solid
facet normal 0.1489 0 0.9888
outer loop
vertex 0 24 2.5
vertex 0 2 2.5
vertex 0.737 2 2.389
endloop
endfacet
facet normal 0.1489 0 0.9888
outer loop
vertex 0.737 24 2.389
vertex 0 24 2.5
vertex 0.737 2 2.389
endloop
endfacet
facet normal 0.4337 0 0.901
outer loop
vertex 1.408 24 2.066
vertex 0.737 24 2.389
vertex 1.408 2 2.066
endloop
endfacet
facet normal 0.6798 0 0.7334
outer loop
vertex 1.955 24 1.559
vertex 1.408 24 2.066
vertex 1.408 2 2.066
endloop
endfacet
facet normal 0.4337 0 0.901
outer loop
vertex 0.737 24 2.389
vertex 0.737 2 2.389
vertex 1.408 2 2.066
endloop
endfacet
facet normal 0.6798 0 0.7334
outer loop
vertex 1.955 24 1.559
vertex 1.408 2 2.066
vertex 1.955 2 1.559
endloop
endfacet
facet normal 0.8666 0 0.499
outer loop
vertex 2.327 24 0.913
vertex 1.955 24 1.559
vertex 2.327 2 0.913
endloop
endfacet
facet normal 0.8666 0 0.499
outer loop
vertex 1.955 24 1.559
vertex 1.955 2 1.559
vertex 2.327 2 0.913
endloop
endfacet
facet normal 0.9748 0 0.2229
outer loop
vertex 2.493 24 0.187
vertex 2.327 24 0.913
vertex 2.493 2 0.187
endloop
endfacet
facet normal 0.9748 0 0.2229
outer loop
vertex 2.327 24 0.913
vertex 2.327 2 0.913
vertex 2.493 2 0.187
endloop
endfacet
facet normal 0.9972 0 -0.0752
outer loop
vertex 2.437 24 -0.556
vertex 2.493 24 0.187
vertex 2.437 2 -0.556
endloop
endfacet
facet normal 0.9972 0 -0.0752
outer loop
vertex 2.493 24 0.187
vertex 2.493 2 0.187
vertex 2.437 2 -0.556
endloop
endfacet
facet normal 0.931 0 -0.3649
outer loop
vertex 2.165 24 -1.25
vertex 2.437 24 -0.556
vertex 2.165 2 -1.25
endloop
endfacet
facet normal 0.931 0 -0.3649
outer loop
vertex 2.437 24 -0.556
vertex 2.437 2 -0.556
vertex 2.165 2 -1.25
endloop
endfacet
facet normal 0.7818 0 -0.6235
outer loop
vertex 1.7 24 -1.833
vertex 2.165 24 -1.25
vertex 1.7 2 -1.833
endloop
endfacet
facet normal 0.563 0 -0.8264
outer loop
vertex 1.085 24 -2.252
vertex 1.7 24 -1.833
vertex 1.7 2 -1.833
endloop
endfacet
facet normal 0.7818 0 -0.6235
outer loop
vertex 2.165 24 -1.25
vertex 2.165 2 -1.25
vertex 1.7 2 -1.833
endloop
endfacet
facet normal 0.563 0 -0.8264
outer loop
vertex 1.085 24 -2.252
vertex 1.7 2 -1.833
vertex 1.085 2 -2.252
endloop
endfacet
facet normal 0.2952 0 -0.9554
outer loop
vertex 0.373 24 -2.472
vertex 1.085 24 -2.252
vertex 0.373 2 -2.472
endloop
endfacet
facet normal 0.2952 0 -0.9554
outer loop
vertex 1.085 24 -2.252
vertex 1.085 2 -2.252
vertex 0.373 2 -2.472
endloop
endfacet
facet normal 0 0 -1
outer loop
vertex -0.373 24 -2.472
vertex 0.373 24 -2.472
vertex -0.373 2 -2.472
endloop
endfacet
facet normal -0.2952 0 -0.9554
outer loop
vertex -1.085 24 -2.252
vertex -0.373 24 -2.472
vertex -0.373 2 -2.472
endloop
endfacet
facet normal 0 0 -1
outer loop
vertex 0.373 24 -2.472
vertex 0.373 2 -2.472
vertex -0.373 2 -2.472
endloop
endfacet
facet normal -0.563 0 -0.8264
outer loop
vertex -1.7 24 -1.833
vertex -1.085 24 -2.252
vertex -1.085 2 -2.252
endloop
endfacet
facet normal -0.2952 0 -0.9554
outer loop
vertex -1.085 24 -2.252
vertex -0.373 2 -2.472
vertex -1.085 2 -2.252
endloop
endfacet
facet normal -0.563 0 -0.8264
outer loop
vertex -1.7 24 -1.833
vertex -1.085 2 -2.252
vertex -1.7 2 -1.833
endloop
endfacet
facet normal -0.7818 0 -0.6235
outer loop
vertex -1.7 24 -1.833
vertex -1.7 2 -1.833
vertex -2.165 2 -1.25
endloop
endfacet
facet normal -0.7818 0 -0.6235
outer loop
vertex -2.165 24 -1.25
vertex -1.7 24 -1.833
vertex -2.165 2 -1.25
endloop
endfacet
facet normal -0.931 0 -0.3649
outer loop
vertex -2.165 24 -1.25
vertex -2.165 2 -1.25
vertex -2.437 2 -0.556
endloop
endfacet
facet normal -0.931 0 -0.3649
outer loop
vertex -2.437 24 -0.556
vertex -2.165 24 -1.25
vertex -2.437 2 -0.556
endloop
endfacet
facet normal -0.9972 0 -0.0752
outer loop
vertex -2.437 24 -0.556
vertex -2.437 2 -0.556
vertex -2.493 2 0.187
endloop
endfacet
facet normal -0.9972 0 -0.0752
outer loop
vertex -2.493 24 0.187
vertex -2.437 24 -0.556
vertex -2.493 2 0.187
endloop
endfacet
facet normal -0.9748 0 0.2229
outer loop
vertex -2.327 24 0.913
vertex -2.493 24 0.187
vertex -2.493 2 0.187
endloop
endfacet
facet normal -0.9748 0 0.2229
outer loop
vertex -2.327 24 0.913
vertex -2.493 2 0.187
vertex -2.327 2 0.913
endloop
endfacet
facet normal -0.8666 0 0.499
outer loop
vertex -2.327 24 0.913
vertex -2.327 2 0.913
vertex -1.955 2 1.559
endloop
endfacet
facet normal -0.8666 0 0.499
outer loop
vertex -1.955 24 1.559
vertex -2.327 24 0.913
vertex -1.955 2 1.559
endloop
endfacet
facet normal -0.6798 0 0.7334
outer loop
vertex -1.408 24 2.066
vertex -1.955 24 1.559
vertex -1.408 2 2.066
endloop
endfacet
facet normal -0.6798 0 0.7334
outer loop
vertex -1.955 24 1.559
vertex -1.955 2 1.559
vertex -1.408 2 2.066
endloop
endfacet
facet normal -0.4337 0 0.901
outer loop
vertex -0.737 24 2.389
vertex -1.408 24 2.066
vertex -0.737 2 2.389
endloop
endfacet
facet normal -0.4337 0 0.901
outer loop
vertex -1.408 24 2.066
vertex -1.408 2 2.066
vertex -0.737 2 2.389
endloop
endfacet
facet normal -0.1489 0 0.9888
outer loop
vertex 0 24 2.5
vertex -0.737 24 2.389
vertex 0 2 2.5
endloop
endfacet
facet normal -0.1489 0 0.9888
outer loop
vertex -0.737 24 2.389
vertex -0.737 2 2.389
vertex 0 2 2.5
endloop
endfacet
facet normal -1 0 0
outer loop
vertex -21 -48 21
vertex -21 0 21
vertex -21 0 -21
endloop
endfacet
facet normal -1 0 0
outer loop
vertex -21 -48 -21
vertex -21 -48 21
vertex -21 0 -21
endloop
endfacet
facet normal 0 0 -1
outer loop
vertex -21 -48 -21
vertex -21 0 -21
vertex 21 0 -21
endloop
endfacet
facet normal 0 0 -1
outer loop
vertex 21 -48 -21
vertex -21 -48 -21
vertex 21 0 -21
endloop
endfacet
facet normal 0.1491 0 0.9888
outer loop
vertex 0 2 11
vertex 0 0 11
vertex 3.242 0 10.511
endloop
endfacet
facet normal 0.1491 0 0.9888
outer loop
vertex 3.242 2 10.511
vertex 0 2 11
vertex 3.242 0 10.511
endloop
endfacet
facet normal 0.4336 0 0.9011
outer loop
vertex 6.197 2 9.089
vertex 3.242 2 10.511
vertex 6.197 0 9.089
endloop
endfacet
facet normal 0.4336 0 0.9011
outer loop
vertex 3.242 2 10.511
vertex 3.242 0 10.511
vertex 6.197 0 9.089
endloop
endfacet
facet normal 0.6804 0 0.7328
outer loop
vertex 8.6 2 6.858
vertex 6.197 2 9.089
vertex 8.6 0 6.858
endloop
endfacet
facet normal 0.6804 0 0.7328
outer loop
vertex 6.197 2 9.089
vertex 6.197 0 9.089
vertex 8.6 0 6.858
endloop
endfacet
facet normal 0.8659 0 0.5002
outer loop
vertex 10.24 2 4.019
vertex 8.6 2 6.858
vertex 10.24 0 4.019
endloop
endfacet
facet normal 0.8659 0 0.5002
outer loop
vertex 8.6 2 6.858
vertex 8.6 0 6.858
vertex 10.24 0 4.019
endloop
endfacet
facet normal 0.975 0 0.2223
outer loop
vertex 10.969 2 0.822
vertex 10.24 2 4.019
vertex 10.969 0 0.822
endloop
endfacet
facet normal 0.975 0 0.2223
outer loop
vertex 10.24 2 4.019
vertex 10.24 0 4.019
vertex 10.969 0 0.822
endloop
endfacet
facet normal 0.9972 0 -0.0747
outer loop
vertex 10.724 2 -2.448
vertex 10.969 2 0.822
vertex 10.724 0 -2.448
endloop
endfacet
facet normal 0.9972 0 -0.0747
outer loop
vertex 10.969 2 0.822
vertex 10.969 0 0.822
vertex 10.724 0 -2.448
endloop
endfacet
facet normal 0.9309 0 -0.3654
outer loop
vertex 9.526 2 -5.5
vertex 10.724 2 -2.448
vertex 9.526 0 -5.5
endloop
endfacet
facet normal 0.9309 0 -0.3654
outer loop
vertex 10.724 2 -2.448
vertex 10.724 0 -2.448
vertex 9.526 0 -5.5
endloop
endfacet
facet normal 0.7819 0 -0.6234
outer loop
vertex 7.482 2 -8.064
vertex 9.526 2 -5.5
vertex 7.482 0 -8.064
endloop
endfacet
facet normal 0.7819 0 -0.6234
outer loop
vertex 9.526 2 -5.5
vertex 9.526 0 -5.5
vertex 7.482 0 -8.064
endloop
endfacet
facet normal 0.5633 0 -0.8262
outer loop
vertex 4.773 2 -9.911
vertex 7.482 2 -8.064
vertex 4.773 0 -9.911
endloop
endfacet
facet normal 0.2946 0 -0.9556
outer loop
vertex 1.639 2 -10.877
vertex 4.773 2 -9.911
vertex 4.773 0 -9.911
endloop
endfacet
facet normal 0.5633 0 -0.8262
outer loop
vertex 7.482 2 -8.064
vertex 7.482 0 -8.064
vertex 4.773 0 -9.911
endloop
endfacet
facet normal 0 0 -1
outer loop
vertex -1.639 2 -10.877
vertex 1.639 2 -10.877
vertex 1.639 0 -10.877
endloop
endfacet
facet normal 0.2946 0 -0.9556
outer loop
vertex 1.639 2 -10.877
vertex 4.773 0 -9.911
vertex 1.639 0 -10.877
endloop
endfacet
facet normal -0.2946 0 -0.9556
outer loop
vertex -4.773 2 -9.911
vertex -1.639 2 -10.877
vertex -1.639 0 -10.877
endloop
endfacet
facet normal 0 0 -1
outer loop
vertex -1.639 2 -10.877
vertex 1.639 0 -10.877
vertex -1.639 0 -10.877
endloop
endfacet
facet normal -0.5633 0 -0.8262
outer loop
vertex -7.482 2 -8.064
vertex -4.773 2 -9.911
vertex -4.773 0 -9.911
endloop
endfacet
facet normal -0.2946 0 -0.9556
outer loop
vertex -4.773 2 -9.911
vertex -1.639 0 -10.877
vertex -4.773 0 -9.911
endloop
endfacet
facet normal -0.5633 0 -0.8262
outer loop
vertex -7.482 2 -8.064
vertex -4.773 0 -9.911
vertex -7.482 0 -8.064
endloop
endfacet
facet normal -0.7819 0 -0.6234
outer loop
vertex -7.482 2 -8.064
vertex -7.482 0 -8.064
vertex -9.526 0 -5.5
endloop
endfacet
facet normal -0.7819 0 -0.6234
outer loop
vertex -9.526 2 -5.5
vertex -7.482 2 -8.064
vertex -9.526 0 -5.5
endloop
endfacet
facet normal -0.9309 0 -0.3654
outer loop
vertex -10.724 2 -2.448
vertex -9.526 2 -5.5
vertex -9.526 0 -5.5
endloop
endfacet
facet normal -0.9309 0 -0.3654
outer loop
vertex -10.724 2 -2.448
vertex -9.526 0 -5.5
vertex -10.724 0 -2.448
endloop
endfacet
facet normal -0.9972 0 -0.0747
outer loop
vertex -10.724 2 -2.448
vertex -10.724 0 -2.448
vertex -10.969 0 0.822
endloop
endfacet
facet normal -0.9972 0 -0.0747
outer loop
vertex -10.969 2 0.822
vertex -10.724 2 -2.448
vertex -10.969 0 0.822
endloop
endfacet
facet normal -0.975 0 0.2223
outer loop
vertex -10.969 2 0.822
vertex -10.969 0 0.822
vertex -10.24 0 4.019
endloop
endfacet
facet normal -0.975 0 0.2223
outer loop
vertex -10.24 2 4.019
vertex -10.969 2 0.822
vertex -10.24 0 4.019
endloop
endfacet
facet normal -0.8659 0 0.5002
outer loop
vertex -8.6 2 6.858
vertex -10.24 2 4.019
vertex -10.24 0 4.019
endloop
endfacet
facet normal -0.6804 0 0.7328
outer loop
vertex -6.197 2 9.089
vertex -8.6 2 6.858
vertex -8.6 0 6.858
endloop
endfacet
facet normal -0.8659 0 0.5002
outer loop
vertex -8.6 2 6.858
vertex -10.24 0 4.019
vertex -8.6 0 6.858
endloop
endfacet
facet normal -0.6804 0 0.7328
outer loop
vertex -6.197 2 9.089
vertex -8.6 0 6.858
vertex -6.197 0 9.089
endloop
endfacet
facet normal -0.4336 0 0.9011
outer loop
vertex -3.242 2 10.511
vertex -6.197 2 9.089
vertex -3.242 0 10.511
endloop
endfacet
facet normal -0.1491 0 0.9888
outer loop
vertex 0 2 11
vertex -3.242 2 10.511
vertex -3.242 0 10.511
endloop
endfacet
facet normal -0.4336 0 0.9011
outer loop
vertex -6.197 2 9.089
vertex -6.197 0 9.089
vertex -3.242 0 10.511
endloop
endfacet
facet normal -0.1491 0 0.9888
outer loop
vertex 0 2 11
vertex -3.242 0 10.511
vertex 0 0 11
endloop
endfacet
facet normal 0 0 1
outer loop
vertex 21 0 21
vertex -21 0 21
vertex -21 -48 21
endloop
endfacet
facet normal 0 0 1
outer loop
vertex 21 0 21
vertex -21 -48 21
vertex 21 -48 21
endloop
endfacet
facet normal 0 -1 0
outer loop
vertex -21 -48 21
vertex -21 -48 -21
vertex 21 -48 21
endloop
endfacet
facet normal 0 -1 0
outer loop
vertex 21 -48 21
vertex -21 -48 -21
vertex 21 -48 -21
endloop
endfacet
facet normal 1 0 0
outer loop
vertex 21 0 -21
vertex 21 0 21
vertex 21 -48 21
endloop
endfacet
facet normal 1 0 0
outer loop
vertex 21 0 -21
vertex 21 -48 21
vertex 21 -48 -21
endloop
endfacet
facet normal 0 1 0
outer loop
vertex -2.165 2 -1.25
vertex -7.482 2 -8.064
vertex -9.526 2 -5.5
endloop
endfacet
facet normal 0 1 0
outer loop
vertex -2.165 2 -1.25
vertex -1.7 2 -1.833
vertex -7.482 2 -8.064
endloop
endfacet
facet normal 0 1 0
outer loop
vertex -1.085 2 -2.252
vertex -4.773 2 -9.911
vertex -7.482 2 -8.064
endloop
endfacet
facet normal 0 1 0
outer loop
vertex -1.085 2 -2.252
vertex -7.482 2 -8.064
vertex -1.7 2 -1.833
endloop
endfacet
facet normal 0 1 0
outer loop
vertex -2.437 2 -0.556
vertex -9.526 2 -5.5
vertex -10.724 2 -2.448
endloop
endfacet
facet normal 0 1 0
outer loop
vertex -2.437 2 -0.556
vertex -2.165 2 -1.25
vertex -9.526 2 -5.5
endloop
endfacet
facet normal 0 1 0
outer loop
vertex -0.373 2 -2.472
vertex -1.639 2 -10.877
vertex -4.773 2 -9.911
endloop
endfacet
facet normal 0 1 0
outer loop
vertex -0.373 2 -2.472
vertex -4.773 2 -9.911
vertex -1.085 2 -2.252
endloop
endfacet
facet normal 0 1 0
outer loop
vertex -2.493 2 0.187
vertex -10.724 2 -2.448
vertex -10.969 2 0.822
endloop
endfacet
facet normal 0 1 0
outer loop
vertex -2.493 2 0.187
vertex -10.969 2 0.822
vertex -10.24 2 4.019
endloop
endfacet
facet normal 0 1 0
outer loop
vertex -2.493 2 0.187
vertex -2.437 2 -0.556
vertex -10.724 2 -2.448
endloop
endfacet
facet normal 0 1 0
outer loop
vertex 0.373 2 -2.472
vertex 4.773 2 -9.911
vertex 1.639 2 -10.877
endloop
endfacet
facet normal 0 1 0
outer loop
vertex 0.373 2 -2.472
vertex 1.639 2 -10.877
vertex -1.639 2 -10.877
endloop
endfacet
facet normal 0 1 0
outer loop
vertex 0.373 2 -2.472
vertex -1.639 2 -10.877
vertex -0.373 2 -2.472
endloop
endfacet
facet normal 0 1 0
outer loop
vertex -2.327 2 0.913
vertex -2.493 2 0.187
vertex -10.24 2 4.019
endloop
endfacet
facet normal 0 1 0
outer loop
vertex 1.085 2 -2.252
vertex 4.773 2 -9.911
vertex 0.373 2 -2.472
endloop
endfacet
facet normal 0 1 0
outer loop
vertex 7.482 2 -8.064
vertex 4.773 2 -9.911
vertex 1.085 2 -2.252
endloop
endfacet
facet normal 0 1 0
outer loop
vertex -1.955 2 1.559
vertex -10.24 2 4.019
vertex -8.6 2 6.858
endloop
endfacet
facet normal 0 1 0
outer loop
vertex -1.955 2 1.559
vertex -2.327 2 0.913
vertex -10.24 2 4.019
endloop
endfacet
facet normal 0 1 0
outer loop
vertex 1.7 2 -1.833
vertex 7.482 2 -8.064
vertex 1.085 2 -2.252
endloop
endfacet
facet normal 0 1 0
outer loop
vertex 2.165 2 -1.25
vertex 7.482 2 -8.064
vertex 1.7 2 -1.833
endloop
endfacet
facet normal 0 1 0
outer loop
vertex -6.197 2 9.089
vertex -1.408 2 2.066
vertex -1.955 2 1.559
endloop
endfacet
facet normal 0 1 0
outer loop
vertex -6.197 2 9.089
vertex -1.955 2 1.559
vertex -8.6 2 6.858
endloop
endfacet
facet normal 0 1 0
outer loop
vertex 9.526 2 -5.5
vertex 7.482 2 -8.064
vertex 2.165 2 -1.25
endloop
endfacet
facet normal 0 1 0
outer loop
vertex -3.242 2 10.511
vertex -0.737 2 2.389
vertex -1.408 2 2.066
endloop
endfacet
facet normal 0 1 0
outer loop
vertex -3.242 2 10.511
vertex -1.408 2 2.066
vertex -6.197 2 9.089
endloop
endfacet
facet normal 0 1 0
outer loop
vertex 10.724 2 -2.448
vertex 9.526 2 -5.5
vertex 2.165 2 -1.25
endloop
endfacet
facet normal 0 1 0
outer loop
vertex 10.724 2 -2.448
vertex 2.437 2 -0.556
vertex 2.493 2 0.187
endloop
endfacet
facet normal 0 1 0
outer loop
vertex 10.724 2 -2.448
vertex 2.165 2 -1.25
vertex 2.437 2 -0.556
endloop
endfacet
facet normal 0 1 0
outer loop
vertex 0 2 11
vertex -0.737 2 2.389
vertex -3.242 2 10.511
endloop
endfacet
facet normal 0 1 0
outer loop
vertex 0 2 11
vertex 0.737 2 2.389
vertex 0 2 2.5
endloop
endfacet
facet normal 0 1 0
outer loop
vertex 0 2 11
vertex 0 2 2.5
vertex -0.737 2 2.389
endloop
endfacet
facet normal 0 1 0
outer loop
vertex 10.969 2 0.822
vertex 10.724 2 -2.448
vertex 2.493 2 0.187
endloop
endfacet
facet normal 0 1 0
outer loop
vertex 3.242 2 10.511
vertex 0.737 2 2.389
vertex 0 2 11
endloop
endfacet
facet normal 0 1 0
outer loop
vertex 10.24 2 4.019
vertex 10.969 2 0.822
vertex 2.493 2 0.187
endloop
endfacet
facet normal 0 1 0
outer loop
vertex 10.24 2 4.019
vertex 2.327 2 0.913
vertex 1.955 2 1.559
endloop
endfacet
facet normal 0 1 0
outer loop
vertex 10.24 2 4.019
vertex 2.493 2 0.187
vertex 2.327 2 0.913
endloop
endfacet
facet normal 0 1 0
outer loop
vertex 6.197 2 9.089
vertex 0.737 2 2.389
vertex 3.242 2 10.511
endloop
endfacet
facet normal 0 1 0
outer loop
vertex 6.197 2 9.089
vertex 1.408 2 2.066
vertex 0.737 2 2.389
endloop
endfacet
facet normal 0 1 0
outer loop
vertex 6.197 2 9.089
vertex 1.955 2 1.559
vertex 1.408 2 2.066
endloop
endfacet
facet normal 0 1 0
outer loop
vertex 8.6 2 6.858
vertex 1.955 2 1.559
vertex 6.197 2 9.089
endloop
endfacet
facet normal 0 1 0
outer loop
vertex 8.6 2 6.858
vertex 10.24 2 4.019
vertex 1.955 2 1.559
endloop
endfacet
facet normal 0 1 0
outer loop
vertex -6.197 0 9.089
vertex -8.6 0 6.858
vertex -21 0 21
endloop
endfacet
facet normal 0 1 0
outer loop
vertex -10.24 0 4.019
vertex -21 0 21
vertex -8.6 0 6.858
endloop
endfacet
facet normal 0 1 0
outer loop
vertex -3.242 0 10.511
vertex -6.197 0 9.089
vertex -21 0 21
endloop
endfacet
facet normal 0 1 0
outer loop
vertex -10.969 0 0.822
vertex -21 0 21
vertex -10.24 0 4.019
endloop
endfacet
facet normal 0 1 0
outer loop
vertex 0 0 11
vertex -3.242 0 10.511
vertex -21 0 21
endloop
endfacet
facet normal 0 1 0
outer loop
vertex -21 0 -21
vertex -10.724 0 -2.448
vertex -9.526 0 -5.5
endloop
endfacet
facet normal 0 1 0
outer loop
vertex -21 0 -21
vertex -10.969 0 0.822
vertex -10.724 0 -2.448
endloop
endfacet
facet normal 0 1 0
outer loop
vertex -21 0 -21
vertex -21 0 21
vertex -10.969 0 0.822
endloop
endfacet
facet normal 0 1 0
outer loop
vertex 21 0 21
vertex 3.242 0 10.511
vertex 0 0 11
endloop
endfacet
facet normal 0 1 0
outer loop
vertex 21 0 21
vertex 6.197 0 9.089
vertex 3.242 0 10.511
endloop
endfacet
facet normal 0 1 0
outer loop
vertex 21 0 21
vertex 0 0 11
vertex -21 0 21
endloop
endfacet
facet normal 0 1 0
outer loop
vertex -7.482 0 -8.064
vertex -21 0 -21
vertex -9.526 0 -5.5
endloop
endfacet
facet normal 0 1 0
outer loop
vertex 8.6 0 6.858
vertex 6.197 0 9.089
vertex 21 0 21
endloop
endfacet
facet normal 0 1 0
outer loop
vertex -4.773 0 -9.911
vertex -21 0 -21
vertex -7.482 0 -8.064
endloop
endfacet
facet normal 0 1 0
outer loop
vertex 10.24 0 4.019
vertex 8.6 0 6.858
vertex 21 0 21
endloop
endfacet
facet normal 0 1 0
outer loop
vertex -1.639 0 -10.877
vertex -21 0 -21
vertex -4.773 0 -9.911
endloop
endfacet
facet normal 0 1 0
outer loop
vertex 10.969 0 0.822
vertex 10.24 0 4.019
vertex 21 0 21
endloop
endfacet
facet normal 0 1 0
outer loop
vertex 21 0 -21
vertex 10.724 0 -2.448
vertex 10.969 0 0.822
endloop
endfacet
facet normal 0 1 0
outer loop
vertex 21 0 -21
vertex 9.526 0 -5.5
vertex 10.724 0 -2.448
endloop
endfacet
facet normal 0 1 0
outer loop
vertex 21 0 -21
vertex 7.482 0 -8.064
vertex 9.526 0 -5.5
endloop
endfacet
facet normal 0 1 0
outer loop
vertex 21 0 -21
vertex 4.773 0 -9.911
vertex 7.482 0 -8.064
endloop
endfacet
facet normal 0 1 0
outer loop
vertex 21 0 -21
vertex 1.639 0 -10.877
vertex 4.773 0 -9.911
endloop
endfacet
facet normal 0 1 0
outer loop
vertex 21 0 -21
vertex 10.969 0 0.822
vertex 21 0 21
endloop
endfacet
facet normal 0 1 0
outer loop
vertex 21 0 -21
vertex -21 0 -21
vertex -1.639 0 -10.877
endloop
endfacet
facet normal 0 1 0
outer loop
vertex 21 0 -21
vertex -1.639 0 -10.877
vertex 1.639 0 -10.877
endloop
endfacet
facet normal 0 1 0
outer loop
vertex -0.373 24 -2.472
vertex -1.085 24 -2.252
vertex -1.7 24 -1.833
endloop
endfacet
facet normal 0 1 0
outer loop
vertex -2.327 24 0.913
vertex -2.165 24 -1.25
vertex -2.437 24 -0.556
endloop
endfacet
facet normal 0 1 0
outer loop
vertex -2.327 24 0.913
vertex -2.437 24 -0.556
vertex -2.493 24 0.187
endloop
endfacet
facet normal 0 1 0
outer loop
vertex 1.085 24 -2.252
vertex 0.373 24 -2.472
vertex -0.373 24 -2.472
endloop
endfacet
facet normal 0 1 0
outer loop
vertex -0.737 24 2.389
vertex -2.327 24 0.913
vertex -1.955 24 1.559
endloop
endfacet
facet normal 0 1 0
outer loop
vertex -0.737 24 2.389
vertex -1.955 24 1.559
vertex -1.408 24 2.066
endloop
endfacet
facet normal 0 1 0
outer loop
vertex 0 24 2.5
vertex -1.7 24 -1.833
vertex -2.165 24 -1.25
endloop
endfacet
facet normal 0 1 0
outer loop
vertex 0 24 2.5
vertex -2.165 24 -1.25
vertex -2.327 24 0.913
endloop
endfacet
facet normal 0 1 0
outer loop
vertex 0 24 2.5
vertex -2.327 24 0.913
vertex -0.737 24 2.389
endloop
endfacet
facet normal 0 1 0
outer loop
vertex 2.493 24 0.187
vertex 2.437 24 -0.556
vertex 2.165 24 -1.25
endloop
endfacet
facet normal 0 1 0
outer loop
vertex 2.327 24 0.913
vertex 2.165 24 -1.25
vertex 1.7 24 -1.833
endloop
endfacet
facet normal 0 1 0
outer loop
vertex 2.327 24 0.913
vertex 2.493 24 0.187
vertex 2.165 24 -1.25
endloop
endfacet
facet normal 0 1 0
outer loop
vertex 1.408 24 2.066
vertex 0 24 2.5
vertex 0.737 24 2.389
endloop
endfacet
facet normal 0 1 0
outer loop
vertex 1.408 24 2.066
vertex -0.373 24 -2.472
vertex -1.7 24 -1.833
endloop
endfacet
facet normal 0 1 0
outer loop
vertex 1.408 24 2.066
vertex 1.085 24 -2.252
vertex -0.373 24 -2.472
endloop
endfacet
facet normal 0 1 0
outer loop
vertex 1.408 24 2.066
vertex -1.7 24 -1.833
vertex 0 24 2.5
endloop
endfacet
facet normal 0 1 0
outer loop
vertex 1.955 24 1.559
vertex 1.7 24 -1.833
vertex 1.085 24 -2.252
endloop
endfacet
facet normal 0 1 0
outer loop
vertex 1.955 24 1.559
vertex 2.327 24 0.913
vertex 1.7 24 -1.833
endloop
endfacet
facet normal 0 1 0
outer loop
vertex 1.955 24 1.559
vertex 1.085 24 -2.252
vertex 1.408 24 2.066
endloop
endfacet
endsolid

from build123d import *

# Parameters (mm, degrees)
SKETCH1_W           = 42
SKETCH1_H           = 42
BOSS_EXTRUDE2_DEPTH = 48
SKETCH5_R           = 11
BOSS_EXTRUDE3_DEPTH = 2
SKETCH6_R           = 2.5
BOSS_EXTRUDE4_DEPTH = 22


with BuildPart() as part:
    # Sketch1 → Boss-Extrude2 (new body)
    with BuildSketch(Plane(origin=(0, 0, 0), x_dir=(1, 0, 0), z_dir=(0, 1, 0))):
        Rectangle(SKETCH1_W, SKETCH1_H)
    extrude(amount=-BOSS_EXTRUDE2_DEPTH)

    # Sketch5 → Boss-Extrude3 (add)
    with BuildSketch(Plane(origin=(0, 0, 0), x_dir=(1, 0, 0), z_dir=(0, 1, 0))):
        with Locations(Location((0, 0, 0), (0, 0, 270))):
            Circle(SKETCH5_R)
    extrude(amount=BOSS_EXTRUDE3_DEPTH)

    # Sketch6 → Boss-Extrude4 (add)
    with BuildSketch(Plane(origin=(0, 2, 0), x_dir=(1, 0, 0), z_dir=(0, 1, 0))):
        with Locations(Location((0, 0, 0), (0, 0, 270))):
            Circle(SKETCH6_R)
    extrude(amount=BOSS_EXTRUDE4_DEPTH)


solid = part.part
